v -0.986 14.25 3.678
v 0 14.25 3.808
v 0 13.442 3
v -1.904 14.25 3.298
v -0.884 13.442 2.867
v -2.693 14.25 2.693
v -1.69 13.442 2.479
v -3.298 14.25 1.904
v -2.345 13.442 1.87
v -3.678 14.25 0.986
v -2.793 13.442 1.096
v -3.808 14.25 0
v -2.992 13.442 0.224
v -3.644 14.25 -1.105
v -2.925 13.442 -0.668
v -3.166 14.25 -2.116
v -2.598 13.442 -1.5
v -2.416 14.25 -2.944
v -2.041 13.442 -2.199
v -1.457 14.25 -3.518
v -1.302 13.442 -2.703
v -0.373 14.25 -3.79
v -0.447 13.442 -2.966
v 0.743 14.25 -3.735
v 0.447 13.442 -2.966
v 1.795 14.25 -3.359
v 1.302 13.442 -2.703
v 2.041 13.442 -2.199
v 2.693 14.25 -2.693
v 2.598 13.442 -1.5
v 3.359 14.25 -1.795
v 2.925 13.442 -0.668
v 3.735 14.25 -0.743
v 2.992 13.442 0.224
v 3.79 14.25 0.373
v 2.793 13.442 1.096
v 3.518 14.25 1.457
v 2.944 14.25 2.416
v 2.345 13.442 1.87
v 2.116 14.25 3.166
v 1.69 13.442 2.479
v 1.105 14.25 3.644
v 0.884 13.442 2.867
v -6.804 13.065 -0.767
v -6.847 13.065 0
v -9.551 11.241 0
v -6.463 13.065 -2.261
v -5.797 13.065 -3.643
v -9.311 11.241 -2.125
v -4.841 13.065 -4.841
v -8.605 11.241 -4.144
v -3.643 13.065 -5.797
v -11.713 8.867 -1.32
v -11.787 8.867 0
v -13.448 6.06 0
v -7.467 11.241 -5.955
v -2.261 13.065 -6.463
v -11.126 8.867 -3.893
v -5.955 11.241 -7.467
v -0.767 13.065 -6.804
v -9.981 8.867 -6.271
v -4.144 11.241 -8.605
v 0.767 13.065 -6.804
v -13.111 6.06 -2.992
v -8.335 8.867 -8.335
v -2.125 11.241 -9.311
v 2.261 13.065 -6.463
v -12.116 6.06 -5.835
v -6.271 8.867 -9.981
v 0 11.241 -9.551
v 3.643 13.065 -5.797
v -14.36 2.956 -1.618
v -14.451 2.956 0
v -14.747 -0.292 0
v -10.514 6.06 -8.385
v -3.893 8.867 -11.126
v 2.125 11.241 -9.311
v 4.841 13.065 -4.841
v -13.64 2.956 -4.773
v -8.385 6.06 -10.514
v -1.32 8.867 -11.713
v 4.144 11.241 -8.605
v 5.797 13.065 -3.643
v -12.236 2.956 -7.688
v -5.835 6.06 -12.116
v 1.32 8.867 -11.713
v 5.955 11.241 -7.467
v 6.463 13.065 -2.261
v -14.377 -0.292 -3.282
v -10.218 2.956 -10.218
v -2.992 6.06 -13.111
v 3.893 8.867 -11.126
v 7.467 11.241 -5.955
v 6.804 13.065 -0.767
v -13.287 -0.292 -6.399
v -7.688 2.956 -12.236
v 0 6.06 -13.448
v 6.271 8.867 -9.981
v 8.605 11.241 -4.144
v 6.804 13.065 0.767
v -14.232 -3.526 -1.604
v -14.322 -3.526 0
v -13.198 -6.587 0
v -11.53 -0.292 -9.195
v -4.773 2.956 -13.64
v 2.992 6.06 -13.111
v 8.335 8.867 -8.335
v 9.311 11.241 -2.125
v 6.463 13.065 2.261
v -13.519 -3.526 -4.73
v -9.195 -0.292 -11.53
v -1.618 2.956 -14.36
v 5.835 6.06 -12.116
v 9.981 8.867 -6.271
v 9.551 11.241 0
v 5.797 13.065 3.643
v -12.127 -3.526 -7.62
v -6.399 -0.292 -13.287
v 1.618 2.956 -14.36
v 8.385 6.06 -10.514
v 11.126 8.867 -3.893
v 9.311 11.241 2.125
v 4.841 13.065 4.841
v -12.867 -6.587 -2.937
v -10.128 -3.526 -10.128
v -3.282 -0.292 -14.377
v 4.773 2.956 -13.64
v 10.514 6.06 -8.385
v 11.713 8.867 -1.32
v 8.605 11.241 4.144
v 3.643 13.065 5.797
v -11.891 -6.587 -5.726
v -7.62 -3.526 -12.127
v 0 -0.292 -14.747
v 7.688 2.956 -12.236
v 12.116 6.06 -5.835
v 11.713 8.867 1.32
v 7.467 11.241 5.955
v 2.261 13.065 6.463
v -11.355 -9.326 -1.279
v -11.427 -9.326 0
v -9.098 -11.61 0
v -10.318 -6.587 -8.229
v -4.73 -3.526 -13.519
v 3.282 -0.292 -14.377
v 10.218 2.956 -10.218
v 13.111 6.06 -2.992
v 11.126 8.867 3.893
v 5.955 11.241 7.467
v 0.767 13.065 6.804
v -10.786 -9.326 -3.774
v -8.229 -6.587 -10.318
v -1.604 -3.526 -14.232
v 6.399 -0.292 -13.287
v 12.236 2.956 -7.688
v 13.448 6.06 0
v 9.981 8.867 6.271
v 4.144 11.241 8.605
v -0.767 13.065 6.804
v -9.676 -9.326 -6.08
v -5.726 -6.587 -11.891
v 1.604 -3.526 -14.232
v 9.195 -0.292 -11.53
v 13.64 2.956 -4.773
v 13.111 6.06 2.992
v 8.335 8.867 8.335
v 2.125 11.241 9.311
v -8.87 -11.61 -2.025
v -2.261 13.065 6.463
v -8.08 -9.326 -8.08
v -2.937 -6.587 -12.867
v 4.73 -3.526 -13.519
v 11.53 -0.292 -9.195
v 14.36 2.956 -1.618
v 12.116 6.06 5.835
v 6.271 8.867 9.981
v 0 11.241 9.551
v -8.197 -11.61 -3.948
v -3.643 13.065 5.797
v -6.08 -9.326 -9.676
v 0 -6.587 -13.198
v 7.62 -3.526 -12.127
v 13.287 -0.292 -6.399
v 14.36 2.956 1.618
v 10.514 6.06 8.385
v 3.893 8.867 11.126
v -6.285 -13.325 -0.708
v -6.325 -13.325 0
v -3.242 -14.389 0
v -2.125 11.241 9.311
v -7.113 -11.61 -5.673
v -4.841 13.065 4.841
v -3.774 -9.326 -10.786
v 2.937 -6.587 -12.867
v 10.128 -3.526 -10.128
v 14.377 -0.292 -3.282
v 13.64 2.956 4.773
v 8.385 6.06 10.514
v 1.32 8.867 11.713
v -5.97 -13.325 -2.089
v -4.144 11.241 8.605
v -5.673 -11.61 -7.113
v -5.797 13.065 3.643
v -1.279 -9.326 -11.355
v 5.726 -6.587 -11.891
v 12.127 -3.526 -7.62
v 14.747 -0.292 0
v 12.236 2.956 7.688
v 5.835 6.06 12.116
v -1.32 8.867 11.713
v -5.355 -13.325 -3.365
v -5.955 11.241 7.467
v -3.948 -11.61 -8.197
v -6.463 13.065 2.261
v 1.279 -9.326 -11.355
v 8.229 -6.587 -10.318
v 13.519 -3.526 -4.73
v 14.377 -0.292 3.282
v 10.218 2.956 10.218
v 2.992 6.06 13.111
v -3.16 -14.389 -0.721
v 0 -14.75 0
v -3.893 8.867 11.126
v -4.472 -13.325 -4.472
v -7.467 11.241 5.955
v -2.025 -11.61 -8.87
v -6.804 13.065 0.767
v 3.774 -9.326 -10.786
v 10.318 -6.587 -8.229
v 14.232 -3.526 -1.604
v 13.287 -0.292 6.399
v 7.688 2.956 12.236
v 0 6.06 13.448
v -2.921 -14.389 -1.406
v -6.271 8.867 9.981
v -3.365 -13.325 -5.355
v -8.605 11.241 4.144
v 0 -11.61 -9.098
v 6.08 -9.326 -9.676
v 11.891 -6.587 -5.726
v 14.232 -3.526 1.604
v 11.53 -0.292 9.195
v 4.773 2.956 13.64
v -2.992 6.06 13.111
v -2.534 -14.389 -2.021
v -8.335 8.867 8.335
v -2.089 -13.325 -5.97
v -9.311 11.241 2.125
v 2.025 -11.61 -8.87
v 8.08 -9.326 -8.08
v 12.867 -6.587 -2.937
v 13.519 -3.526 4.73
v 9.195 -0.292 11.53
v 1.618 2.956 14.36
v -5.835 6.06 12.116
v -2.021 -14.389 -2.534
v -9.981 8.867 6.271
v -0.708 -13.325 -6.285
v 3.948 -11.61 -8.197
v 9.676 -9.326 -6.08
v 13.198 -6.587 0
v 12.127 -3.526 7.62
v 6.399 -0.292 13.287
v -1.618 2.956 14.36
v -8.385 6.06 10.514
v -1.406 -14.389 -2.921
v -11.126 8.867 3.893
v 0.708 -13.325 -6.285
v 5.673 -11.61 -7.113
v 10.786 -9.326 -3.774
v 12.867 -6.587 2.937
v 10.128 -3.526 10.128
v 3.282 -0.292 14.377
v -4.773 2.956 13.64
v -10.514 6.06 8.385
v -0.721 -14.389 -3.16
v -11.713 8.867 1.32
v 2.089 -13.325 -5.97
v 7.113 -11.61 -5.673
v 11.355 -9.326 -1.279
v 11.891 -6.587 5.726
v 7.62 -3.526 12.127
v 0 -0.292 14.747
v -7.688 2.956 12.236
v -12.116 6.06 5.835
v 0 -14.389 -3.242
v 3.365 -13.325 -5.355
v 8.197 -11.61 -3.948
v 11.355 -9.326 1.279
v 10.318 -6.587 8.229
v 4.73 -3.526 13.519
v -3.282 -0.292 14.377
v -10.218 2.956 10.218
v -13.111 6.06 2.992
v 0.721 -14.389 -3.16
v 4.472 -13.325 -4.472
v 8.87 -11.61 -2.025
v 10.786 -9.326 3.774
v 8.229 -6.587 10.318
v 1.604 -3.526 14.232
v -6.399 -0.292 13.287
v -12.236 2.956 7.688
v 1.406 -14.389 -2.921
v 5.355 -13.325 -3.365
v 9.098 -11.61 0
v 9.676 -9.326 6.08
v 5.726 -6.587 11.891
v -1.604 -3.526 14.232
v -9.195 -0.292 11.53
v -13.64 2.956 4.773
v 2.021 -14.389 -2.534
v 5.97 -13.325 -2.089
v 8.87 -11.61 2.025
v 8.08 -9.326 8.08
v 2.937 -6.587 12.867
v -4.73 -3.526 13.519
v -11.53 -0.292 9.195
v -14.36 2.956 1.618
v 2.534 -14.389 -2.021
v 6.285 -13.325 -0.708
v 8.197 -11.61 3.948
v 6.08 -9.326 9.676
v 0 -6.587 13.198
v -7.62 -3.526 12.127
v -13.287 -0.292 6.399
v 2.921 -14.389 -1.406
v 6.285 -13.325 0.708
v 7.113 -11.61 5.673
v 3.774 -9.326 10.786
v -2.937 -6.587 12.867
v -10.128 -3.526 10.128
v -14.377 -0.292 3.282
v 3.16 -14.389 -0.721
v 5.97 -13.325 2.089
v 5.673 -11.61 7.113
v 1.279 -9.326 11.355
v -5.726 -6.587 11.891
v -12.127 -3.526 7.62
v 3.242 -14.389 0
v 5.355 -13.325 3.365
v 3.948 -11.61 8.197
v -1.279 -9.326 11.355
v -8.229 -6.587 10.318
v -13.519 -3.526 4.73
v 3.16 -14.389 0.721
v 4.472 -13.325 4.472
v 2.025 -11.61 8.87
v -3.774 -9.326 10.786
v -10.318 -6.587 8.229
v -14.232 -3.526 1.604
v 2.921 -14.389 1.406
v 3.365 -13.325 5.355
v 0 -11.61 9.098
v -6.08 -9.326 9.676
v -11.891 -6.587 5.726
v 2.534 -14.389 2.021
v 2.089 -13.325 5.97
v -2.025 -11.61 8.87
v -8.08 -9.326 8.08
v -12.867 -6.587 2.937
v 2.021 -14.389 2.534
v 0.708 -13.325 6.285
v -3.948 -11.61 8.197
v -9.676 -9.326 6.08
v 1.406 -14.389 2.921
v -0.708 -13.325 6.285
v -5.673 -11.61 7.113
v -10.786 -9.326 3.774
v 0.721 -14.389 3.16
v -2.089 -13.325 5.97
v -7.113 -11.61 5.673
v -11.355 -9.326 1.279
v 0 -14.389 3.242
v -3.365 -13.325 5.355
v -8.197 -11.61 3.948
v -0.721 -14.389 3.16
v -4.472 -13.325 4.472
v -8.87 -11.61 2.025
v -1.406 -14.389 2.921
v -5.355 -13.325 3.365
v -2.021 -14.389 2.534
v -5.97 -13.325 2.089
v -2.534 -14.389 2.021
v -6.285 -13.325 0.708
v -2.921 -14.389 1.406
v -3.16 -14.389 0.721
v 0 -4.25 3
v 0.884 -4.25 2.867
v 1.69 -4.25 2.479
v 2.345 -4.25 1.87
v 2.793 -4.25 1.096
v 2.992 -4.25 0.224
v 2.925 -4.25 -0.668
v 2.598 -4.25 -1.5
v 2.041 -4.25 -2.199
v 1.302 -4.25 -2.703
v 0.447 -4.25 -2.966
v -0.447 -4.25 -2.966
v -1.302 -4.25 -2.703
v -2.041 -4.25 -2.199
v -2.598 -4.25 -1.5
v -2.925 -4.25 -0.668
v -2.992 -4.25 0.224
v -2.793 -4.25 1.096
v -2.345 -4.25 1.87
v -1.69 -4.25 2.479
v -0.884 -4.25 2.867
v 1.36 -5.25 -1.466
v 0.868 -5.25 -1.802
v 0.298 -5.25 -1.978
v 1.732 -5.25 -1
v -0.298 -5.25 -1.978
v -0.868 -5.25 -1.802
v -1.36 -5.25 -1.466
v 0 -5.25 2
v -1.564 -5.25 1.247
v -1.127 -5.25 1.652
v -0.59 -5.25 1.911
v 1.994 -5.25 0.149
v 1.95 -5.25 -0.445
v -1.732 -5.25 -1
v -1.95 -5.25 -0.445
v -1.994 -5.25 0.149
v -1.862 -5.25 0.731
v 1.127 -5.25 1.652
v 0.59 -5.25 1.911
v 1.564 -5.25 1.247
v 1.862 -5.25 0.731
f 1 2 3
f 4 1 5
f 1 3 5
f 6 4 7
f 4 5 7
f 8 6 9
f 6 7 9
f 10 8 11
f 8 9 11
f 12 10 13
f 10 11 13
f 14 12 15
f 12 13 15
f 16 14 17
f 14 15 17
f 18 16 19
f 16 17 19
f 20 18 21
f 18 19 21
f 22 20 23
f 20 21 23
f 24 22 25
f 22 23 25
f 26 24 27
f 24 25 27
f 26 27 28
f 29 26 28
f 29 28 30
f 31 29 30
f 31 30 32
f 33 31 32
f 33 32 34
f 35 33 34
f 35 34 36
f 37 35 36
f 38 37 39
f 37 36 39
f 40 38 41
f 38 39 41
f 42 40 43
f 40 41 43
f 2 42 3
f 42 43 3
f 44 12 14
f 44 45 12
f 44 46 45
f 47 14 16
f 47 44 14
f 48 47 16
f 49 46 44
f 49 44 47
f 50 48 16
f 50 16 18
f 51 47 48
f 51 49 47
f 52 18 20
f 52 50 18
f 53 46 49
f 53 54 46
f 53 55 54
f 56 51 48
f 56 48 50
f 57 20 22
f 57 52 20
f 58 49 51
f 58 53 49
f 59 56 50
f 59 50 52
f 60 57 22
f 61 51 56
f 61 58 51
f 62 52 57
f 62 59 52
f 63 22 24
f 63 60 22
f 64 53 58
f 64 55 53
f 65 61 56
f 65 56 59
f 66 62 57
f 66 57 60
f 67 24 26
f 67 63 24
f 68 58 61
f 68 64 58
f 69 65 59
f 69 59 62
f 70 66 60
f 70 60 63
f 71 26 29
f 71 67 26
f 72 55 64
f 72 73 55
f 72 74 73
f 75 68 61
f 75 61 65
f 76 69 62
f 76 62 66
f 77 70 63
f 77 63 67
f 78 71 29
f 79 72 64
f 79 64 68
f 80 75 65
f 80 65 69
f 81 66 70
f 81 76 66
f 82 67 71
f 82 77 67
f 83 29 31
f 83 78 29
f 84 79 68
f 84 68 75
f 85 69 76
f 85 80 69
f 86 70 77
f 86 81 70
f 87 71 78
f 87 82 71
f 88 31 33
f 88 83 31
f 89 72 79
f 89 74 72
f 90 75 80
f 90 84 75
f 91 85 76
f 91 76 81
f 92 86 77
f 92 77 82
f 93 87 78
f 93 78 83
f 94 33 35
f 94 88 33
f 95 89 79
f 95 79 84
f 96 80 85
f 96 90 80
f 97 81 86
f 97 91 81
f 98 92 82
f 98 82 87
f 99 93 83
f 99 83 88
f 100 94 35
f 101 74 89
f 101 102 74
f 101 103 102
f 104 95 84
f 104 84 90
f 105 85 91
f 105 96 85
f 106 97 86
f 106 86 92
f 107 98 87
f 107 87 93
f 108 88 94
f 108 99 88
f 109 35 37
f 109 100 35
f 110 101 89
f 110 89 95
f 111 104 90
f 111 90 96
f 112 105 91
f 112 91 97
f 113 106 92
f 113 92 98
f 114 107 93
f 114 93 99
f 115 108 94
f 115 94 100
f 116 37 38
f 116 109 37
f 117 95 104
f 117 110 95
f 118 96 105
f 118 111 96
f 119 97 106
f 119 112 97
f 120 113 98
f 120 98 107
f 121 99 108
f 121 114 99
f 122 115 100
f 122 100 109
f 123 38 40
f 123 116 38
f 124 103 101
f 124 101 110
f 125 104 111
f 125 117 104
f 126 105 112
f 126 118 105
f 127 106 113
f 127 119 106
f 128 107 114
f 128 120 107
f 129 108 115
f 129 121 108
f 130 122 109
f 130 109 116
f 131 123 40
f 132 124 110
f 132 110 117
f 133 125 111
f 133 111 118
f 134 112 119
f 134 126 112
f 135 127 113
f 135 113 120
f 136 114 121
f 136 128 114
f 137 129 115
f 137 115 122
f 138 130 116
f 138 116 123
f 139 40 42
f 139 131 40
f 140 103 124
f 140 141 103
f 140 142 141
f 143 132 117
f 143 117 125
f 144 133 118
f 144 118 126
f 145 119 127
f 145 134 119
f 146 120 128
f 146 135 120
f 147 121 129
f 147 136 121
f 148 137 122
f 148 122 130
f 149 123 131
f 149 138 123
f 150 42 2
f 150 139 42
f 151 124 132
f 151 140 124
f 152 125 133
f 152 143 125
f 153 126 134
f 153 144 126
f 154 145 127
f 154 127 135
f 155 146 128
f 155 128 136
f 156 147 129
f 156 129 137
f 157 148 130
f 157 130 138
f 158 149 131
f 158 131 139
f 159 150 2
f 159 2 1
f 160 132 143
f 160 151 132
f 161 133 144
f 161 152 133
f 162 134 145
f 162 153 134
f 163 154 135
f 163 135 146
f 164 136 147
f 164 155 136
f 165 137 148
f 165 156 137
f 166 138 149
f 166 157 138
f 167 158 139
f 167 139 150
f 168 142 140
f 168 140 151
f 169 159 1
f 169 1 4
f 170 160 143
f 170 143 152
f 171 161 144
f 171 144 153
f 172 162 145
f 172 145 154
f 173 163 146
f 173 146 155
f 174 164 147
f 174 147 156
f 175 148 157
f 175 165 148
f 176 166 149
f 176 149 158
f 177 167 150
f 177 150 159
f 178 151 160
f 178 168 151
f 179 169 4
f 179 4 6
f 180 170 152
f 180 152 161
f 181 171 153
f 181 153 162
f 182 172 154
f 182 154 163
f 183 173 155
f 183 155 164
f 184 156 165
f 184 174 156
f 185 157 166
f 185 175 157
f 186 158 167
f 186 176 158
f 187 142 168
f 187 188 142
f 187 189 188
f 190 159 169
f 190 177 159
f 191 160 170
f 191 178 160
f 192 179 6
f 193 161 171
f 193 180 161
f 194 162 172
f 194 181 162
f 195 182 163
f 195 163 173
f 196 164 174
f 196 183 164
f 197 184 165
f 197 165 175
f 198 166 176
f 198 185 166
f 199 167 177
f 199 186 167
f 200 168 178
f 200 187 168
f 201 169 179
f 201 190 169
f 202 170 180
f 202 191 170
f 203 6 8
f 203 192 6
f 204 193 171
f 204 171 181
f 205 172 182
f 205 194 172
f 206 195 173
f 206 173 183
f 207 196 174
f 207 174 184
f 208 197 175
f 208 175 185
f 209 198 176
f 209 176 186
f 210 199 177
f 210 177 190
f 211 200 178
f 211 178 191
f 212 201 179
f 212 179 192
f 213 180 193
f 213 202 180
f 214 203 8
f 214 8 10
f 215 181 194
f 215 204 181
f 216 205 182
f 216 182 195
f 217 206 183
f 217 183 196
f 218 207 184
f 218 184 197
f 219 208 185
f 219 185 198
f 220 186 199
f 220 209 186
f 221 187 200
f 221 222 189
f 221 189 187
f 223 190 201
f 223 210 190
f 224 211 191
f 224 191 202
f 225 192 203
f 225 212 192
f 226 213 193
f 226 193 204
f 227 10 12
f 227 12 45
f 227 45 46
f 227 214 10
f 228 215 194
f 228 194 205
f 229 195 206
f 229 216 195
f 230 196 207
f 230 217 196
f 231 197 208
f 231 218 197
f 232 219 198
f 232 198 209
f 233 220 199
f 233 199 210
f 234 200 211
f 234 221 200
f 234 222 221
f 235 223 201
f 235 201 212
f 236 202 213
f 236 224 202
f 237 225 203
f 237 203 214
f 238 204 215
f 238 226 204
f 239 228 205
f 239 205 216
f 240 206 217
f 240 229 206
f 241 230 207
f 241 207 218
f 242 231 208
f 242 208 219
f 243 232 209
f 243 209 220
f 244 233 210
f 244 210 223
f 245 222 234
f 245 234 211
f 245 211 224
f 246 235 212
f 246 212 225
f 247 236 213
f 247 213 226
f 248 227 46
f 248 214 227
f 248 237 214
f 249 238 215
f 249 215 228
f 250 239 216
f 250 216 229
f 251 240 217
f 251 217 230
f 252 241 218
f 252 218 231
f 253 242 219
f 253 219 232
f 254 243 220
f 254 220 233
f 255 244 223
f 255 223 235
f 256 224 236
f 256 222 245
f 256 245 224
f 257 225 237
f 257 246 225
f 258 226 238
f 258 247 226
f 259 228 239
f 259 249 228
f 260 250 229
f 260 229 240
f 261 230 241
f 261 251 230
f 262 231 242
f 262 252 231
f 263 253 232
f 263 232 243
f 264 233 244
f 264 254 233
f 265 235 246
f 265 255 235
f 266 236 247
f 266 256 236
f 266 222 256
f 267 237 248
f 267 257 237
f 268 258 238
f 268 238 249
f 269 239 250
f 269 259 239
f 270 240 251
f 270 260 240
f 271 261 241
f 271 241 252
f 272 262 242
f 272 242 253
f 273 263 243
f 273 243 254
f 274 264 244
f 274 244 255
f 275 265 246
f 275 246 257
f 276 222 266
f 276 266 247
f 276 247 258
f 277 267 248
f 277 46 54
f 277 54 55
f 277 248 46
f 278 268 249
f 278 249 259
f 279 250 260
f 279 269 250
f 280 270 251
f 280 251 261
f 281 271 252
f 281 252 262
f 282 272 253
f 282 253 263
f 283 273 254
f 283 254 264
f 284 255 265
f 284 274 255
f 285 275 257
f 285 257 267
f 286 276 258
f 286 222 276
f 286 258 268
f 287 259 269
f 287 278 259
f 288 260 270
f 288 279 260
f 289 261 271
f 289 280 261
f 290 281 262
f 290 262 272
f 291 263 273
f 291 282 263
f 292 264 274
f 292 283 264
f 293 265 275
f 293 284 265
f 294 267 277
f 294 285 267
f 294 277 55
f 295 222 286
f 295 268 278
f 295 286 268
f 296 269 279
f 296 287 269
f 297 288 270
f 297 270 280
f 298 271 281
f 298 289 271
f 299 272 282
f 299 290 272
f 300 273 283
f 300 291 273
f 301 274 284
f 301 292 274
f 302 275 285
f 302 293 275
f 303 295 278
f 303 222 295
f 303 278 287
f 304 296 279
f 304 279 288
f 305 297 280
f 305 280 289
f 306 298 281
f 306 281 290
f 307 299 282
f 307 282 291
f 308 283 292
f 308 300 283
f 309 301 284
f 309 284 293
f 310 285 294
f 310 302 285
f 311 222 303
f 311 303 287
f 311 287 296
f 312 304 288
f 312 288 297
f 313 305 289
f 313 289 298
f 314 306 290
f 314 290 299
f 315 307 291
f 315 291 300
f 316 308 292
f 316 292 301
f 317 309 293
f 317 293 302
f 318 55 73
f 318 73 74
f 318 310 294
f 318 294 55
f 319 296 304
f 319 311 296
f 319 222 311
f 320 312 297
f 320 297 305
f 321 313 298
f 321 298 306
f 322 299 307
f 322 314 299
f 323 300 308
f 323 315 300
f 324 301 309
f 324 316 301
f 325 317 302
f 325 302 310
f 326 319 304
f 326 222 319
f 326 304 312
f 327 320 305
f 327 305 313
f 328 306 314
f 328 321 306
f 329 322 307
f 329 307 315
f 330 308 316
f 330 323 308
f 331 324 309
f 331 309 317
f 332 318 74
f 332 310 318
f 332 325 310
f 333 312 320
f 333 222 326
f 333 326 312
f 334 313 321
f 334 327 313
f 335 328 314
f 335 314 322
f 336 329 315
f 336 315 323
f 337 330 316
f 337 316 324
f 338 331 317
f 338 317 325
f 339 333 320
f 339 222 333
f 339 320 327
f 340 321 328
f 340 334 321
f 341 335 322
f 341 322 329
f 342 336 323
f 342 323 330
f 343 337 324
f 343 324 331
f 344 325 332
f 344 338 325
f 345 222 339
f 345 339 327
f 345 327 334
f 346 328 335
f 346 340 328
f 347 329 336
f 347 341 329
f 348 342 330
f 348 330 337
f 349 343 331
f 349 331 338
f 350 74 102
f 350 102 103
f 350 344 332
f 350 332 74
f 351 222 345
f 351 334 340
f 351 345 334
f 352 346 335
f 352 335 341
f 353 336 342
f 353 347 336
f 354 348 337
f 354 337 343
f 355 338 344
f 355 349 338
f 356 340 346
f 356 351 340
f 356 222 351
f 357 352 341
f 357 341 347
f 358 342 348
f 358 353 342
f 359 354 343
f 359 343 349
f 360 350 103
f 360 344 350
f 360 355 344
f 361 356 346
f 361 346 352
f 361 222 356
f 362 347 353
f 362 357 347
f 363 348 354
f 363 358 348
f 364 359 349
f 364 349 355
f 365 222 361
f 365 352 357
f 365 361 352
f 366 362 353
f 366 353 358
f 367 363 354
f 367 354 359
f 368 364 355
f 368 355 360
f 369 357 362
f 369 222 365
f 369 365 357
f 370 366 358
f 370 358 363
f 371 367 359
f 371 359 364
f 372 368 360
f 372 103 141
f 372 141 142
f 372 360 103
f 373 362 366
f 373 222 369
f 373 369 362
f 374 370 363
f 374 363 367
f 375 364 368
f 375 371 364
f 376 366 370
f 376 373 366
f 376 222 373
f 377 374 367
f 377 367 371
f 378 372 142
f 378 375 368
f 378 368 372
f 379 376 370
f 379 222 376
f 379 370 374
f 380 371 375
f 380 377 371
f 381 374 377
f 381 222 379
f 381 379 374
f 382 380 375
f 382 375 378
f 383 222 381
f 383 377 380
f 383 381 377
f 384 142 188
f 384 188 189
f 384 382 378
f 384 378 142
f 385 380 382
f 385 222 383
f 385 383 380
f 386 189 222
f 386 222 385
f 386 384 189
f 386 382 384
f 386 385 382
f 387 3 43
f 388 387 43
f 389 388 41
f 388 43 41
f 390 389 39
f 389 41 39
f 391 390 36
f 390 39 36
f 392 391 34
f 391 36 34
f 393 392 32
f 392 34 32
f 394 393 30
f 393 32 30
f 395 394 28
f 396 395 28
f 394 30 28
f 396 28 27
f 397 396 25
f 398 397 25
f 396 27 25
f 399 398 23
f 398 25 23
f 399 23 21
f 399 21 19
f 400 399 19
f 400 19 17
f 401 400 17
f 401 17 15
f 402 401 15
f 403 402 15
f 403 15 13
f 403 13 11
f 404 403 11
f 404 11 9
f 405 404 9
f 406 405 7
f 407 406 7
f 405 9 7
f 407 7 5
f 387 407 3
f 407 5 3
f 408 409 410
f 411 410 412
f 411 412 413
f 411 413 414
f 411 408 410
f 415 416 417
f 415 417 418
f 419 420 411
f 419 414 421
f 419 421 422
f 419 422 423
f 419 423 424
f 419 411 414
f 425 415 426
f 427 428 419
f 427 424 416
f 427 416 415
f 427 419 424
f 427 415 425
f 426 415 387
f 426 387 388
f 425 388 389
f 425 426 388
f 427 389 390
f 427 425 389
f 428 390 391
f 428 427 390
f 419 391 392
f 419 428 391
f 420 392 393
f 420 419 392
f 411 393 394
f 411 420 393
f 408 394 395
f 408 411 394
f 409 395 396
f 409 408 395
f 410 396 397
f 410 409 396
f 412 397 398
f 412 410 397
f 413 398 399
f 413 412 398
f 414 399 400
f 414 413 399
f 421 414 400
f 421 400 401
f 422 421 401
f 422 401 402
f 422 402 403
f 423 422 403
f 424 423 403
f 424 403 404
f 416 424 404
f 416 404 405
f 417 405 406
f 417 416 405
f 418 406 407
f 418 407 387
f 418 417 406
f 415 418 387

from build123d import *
from build123d.topology import SkipClean

# Parameters (mm, degrees)
IZIM2_R               = 3
KES_EKSTR_ZYON1_DEPTH = 20
PAH1_SIZE             = 1
PAH2_SIZE             = 1


with BuildPart() as part:
    # Çizim1 → Döndür2 (revolve)
    with SkipClean():  # the faces are left unmerged after this step: merging them gives an invalid solid
        with BuildSketch(Plane.XY):
            with BuildLine():
                ThreePointArc((14.75, 0), (10.429825023, 10.429825023), (0, 14.75))
                Line((0, 14.75), (0, -14.75))
                ThreePointArc((0, -14.75), (10.429825023, -10.429825023), (14.75, 0))
            make_face()
            with BuildLine():
                Line((0, -14.75), (0, 14.75))
                ThreePointArc((0, 14.75), (-14.75, 0), (0, -14.75))
            make_face()
        revolve(axis=Axis((0, 19.521191609, 0), (0, -1, 0)))

    # Çizim2 → Kes-Ekstrüzyon1 (cut)
    with BuildSketch(Plane(origin=(0, 14.75, 0), x_dir=(1, 0, 0), z_dir=(0, 1, 0))):
        with Locations(Location((0, 0, 0), (0, 0, 270))):
            Circle(IZIM2_R)
    extrude(amount=-KES_EKSTR_ZYON1_DEPTH, mode=Mode.SUBTRACT)

    # Pah1
    # the kernel refuses this chamfer: 1, 0.845674781 mm, written as the material it takes off along each edge
    with BuildSketch(Plane(origin=(0, 14.441693114, 0), x_dir=(0, 0, 1), z_dir=(1, 0, 0))) as pah1_piece_1:
        with BuildLine():
            Line((3.808218247, 0.191781753), (3, PAH1_SIZE))
            Line((3, PAH1_SIZE), (3, 0))
            ThreePointArc((3, 0), (3.415662232, 0.092625147), (3.808218247, 0.191781753))
        make_face()
    revolve(axis=Axis((0, 14.441693114, 0), (0, -1, 0)), revolution_arc=270, mode=Mode.SUBTRACT)
    with BuildSketch(Plane(origin=(0, 14.441693114, 0), x_dir=(0, 0, 1), z_dir=(-1, 0, 0))) as pah1_piece_2:
        with BuildLine():
            Line((3.808218247, -0.191781753), (3, -PAH1_SIZE))
            Line((3, -PAH1_SIZE), (3, 0))
            ThreePointArc((3, 0), (3.415662232, -0.092625147), (3.808218247, -0.191781753))
        make_face()
    revolve(axis=Axis((0, 14.441693114, 0), (0, 1, 0)), revolution_arc=90, mode=Mode.SUBTRACT)

    # Pah2
    pah2_edges = [part.edges().sort_by_distance(p)[0] for p in [
        (0, -5.25, -3),
    ]]
    chamfer(pah2_edges, length=PAH2_SIZE)


solid = part.part
